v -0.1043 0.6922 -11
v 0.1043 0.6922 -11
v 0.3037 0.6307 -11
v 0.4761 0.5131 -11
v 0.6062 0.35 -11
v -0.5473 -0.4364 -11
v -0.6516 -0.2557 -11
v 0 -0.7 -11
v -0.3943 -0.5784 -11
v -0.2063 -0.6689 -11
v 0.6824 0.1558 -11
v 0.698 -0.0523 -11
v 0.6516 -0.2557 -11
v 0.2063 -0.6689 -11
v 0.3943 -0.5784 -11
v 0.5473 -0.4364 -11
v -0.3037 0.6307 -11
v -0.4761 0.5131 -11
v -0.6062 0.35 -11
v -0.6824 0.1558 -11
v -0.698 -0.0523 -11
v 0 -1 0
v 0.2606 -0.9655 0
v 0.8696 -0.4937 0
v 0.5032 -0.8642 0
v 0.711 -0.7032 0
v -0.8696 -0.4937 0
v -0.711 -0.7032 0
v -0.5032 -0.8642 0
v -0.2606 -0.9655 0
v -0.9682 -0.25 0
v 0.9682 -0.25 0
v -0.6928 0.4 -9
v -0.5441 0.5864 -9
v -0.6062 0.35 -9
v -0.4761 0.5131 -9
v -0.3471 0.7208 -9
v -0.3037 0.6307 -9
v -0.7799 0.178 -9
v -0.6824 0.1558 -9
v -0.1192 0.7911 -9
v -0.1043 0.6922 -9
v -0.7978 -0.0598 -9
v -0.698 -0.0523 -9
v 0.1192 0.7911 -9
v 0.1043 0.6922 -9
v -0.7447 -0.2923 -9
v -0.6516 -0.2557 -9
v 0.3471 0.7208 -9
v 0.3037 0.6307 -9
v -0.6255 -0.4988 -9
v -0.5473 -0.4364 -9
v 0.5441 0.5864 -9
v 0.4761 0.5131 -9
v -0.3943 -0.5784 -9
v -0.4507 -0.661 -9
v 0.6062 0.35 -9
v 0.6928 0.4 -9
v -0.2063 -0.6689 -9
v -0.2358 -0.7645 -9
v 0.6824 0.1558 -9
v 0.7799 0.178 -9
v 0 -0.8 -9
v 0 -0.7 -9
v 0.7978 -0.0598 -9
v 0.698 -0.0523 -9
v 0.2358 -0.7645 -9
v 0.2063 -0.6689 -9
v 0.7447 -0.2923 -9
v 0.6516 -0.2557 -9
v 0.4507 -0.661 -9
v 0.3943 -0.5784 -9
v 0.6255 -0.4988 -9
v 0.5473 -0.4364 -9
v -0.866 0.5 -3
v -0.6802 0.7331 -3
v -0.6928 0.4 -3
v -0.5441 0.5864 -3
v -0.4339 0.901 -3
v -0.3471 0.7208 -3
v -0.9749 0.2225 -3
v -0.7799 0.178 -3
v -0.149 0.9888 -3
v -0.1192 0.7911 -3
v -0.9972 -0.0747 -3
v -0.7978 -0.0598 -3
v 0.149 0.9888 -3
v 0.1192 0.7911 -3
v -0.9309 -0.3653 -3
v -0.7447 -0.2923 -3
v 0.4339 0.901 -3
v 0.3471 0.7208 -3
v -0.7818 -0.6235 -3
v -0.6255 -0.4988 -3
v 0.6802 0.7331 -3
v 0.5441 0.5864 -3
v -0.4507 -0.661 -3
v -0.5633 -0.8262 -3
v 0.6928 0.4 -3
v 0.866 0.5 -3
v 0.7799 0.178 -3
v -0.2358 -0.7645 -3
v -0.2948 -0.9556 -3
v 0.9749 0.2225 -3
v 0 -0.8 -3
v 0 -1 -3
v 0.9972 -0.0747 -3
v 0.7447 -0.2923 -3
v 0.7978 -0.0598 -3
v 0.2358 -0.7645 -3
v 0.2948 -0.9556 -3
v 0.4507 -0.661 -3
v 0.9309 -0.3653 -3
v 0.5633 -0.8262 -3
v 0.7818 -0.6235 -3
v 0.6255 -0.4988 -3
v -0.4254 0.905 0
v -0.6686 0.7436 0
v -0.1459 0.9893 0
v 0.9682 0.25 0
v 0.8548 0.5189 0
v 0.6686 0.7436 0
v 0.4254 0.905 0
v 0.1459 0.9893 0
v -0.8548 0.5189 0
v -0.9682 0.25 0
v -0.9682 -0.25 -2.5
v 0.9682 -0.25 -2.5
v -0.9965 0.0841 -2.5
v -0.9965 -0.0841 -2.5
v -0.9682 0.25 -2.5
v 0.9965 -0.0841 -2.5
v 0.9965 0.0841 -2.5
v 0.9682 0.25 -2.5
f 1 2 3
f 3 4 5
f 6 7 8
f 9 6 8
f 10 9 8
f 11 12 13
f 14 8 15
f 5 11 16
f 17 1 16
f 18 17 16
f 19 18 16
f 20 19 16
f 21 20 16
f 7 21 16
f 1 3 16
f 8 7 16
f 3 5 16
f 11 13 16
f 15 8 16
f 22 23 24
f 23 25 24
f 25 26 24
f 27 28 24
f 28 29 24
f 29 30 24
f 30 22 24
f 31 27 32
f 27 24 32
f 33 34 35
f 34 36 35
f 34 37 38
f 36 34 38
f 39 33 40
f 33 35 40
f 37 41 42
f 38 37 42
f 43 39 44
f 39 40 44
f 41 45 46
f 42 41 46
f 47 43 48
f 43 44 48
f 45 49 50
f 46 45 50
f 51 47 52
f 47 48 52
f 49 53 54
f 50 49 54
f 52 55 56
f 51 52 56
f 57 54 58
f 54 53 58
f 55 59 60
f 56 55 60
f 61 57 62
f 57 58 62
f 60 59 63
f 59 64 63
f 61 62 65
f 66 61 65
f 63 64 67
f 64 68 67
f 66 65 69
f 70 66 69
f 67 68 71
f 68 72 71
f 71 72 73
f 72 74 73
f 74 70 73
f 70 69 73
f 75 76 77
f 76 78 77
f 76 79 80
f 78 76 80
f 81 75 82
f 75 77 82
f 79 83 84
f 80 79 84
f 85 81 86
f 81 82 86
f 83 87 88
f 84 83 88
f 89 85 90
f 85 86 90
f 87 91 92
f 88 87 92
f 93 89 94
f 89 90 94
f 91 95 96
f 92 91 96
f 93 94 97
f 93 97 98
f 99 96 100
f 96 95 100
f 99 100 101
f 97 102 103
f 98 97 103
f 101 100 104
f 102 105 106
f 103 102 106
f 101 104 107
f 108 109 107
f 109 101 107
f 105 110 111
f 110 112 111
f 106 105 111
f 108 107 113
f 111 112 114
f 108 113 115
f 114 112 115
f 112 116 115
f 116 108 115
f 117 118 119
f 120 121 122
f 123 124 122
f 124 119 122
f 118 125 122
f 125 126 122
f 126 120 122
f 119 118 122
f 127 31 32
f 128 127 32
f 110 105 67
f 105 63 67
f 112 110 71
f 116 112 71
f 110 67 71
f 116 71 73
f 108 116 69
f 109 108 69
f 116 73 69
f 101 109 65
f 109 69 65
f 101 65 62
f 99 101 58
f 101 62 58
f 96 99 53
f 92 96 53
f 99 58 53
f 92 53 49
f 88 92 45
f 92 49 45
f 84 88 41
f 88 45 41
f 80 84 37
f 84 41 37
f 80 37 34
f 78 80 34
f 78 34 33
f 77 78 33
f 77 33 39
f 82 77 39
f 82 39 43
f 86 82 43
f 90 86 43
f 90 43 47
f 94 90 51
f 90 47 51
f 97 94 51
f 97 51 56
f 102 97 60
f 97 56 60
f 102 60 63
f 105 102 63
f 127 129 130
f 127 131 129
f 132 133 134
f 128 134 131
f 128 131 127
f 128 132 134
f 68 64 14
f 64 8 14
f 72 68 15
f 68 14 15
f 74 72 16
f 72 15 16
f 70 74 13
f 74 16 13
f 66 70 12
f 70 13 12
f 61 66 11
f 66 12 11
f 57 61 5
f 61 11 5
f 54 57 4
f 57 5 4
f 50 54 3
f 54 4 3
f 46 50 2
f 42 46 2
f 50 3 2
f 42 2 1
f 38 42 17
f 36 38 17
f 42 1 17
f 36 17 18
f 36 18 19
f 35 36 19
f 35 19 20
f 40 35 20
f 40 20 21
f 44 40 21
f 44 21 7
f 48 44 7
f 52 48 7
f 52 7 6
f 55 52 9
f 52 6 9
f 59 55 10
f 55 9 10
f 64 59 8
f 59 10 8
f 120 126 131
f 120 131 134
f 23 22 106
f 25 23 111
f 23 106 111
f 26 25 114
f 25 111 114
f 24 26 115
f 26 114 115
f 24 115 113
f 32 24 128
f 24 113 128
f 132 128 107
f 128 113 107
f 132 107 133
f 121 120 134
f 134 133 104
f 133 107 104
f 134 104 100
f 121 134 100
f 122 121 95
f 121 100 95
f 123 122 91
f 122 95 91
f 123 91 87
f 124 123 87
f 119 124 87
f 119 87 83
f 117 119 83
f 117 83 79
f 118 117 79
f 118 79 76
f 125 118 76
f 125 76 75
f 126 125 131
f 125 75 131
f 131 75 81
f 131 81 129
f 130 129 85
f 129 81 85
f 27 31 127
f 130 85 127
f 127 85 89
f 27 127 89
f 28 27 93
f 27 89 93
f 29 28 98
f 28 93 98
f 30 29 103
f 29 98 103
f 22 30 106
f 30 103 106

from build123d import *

# Parameters (mm, degrees)
SKETCH001_W  = 0.5
SKETCH001_H  = 2
POCKET_DEPTH = 2.5


with BuildPart() as part:
    # Sketch → Revolution (revolve)
    with BuildSketch(Plane.YZ):
        Polygon((0, 0), (-1, 0), (-1, -3), (-0.8, -3), (-0.8, -9), (-0.7, -9), (-0.7, -11), (0, -11), align=None)
    revolve(axis=Axis((0, 0, 0), (0, 0, 1)))

    # Sketch001 (on Face1 of Revolution) → Pocket (cut)
    with BuildSketch(Plane(origin=(0, 0, 0), x_dir=(0, -1, 0), z_dir=(0, 0, 1))):
        Rectangle(SKETCH001_W, SKETCH001_H)
    extrude(amount=-POCKET_DEPTH, mode=Mode.SUBTRACT)


solid = part.part
